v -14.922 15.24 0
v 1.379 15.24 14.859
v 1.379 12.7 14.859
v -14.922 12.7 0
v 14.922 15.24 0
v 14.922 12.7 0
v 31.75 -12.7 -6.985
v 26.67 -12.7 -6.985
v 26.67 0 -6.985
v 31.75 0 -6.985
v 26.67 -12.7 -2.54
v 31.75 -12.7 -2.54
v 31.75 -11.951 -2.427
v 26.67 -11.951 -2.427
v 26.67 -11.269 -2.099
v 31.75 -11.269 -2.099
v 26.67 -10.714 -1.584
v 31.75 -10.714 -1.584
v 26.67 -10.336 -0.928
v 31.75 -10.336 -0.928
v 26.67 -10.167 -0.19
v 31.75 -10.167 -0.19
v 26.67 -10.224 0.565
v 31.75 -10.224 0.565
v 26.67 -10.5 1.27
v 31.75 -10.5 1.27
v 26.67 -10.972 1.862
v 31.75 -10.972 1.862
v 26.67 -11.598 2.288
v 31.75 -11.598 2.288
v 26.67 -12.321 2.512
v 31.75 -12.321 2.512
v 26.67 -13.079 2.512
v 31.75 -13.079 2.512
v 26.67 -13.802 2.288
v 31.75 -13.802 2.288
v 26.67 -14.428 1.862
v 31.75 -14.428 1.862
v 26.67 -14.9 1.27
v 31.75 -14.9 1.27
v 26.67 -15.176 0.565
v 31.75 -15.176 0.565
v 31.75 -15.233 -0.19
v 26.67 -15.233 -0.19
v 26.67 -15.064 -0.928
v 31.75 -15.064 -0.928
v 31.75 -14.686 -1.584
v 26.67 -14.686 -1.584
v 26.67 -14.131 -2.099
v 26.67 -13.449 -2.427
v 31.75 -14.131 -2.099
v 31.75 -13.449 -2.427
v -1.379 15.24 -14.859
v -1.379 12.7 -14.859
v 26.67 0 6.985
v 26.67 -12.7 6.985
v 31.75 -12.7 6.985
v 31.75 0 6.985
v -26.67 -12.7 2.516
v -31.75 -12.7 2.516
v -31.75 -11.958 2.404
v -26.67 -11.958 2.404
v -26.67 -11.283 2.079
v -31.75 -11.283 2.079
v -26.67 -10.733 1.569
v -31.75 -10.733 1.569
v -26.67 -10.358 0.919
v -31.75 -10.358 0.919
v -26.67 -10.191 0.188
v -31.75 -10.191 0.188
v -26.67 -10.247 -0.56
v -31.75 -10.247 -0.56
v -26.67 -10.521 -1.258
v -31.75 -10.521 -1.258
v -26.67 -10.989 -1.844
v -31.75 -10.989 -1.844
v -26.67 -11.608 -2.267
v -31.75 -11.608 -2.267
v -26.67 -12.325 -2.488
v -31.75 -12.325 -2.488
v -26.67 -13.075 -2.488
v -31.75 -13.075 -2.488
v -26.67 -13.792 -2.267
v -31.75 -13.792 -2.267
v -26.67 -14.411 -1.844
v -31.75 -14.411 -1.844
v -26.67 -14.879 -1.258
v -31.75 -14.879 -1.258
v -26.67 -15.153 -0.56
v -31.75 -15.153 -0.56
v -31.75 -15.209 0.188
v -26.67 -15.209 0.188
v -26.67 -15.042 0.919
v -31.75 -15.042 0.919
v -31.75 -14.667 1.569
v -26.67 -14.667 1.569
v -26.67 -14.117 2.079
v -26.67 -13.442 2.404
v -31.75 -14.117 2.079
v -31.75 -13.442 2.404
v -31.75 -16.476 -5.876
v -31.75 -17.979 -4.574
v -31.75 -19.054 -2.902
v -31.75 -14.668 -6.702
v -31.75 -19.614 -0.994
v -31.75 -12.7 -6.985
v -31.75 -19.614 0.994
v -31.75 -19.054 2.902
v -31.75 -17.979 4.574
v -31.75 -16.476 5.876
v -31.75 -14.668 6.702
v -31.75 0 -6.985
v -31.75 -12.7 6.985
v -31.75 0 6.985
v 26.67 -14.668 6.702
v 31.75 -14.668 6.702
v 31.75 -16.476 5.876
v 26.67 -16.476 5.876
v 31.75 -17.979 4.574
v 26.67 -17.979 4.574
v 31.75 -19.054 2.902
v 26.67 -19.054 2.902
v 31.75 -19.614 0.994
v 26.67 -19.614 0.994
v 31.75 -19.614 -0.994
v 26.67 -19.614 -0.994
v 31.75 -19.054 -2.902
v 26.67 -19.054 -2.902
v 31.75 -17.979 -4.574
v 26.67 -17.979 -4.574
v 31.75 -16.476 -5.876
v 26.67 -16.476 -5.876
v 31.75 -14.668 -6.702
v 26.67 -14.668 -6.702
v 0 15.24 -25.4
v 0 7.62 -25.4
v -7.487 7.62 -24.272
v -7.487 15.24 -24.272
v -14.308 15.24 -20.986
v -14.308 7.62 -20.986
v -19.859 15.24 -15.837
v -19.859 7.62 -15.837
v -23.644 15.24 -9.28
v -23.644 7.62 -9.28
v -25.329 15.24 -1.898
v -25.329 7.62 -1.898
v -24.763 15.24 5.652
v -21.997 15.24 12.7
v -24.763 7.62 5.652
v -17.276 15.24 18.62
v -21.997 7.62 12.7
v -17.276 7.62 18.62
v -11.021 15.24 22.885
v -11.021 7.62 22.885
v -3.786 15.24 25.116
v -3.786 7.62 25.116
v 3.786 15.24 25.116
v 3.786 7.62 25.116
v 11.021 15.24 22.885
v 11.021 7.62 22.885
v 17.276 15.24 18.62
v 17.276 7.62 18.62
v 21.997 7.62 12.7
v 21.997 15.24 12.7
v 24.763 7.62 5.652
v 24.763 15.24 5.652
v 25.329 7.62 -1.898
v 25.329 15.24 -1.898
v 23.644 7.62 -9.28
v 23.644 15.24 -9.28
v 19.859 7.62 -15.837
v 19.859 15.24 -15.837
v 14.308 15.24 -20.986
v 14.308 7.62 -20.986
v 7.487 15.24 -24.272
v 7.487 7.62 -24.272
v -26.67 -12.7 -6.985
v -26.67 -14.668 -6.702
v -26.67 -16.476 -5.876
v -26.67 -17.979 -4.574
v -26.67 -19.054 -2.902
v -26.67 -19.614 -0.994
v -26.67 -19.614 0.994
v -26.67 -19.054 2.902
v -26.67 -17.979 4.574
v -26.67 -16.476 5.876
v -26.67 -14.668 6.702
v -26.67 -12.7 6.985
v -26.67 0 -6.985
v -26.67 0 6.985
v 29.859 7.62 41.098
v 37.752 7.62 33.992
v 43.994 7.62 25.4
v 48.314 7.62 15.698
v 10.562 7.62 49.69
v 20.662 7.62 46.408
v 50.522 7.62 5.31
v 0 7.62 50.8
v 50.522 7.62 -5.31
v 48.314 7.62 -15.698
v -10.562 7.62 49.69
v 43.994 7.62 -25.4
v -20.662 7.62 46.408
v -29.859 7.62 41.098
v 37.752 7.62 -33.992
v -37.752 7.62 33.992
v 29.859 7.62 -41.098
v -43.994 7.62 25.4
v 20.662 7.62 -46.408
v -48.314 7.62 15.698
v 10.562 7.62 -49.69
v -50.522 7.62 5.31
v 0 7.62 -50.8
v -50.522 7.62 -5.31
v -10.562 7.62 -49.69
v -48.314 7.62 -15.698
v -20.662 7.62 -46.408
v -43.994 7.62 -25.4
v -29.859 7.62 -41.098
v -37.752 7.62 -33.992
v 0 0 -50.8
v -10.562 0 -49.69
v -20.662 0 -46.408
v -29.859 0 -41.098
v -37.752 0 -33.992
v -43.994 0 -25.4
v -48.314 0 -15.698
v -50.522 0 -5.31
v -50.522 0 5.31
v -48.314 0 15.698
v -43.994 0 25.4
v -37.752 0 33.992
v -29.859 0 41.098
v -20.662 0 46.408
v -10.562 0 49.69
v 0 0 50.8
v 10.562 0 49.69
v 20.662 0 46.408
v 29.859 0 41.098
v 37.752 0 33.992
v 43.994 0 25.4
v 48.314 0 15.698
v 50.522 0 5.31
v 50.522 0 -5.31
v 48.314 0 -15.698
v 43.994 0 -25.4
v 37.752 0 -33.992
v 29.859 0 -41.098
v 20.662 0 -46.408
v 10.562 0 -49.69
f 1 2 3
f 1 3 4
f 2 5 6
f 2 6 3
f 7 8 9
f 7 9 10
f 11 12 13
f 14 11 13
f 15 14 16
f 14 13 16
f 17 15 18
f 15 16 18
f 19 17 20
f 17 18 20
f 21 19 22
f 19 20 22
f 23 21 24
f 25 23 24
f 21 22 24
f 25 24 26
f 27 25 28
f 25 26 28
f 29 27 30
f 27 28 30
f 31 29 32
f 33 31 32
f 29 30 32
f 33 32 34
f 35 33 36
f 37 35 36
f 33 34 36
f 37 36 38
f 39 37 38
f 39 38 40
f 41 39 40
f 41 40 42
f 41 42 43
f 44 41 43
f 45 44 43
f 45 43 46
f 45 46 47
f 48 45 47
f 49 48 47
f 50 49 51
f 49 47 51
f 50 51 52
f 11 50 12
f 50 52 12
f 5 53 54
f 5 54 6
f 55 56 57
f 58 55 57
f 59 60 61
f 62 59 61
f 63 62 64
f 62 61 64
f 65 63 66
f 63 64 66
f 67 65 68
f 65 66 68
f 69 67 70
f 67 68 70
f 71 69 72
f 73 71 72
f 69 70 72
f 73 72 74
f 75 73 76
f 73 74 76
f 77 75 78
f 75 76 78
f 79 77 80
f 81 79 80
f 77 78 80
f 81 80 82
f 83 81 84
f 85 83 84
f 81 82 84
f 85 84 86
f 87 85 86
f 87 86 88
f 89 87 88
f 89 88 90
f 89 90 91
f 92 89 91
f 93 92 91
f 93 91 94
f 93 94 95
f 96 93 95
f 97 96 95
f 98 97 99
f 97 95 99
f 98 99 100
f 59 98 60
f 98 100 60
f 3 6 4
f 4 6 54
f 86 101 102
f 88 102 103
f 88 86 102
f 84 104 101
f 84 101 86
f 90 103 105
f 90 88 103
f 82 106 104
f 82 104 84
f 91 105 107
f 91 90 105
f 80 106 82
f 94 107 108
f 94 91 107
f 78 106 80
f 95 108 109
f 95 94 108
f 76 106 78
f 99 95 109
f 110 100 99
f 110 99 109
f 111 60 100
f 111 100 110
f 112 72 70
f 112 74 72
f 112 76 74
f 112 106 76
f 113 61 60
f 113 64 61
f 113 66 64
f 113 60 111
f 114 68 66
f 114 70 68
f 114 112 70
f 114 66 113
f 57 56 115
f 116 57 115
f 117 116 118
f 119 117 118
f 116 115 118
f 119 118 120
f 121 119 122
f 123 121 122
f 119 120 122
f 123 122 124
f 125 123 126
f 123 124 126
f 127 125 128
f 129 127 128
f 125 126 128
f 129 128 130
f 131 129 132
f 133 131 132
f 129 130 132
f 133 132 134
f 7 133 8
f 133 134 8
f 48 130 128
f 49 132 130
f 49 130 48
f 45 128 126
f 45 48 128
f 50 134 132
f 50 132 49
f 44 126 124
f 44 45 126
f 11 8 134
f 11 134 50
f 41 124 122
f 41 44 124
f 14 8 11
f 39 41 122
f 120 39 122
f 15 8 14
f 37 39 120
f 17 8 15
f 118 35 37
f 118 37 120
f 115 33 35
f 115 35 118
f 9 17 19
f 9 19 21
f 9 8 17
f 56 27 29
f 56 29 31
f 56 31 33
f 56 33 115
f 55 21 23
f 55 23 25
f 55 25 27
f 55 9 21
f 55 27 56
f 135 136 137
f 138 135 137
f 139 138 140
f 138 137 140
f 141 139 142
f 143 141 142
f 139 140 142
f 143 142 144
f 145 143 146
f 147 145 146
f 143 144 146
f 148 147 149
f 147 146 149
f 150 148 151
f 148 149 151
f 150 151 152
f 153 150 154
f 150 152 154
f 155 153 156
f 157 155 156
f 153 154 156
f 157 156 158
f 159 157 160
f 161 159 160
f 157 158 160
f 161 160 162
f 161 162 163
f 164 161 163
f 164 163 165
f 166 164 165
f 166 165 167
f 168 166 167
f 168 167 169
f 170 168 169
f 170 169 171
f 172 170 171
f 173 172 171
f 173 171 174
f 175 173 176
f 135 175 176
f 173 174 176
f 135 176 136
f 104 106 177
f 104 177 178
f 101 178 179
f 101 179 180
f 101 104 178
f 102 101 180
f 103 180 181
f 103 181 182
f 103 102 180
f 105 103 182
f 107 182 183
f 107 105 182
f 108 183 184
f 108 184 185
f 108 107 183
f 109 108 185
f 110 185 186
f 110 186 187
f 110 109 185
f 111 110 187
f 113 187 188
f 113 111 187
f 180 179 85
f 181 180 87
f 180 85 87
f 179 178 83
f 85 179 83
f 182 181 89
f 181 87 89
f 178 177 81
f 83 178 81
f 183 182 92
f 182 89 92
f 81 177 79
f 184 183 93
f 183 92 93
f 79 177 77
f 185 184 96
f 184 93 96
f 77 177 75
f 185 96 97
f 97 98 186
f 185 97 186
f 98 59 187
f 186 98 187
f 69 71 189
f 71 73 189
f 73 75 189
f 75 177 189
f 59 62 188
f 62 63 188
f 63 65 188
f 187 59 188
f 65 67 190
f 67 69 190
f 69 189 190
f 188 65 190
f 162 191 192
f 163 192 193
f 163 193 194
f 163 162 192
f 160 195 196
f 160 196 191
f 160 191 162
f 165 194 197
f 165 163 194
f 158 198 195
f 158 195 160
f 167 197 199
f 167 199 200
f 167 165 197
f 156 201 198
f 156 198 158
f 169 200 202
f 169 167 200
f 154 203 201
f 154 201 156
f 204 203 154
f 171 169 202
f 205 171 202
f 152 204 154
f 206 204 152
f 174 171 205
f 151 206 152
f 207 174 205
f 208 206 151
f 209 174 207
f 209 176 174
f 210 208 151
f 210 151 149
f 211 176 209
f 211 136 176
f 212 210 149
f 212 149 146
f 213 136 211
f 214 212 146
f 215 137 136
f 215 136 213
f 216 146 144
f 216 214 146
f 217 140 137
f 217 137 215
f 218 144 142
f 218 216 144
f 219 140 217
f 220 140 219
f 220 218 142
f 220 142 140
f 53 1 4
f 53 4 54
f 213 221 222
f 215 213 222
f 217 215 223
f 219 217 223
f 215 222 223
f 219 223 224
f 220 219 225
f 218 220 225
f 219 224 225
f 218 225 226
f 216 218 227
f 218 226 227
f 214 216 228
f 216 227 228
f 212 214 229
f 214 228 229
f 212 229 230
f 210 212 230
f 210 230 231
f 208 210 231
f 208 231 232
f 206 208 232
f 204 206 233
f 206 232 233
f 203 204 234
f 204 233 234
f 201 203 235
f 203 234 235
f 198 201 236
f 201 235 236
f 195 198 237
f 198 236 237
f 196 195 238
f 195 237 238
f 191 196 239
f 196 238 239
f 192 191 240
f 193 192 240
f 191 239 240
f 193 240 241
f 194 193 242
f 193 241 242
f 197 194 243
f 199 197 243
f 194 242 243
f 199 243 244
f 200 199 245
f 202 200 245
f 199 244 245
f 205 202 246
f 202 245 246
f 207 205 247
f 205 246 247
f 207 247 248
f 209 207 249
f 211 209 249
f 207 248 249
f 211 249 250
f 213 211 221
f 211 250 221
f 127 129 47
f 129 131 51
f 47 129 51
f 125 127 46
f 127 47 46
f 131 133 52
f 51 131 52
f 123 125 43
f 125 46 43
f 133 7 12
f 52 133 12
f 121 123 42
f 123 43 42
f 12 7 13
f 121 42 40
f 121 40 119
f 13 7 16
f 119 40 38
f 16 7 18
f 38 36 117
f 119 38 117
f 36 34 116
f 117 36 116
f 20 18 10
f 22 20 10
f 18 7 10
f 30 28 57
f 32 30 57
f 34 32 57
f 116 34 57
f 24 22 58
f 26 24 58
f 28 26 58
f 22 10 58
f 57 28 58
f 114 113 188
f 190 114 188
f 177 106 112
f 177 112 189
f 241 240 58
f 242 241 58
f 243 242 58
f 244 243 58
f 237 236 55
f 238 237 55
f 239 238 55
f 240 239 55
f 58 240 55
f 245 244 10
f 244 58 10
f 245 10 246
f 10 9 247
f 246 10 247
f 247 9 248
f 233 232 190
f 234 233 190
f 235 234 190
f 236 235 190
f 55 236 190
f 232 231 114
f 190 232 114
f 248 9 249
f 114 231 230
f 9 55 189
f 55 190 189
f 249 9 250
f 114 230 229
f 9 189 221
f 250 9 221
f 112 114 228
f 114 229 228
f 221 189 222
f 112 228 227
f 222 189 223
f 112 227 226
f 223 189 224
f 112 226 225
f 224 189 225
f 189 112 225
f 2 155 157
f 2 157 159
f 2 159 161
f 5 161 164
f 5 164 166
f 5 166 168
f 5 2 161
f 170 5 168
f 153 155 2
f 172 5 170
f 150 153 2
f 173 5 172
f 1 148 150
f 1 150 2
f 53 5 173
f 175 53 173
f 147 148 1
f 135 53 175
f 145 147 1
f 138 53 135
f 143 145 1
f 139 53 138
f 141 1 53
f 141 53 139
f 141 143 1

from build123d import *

# Parameters (mm, degrees)
SKETCH1_R           = 50.8
BOSS_EXTRUDE1_DEPTH = 7.62
SKETCH2_W           = 5.08
SKETCH2_H           = 13.97
BOSS_EXTRUDE2_DEPTH = 12.7
SKETCH3_R           = 6.985
BOSS_EXTRUDE3_DEPTH = 5.08
SKETCH4_R           = 2.516115175
CUT_EXTRUDE1_DEPTH  = 5.08
SKETCH5_W           = 5.08
SKETCH5_H           = 13.97
BOSS_EXTRUDE4_DEPTH = 12.7
BOSS_EXTRUDE5_START = -5.08
SKETCH6_R           = 6.985
BOSS_EXTRUDE5_DEPTH = 5.08
SKETCH8_R           = 2.54
CUT_EXTRUDE2_DEPTH  = 5.08
SKETCH9_R           = 25.4
BOSS_EXTRUDE6_DEPTH = 7.62
CUT_EXTRUDE3_DEPTH  = 2.54


with BuildPart() as part:
    # Sketch1 → Boss-Extrude1 (new body)
    with BuildSketch(Plane(origin=(0, 0, 0), x_dir=(1, 0, 0), z_dir=(0, 1, 0))):
        with Locations(Location((0, 0, 0), (0, 0, 90))):
            Circle(SKETCH1_R)
    extrude(amount=BOSS_EXTRUDE1_DEPTH)

    # Sketch2 → Boss-Extrude2 (add)
    with BuildSketch(Plane.XZ):
        with Locations((-29.21, 0)):
            Rectangle(SKETCH2_W, SKETCH2_H)
    extrude(amount=BOSS_EXTRUDE2_DEPTH)

    # Sketch3 → Boss-Extrude3 (add)
    with BuildSketch(Plane.ZY.offset(31.75)):
        with Locations((0, -12.7)):
            Circle(SKETCH3_R)
    extrude(amount=-BOSS_EXTRUDE3_DEPTH)

    # Sketch4 → Cut-Extrude1 (cut)
    with BuildSketch(Plane.ZY.offset(31.75)):
        with Locations((0, -12.7)):
            Circle(SKETCH4_R)
    extrude(amount=-CUT_EXTRUDE1_DEPTH, mode=Mode.SUBTRACT)

    # Sketch5 → Boss-Extrude4 (add)
    with BuildSketch(Plane.XZ):
        with Locations((29.21, 0)):
            Rectangle(SKETCH5_W, SKETCH5_H)
    extrude(amount=BOSS_EXTRUDE4_DEPTH)

    # Sketch6 → Boss-Extrude5 (add)
    with BuildSketch(Plane(origin=(31.75, 0, 0), x_dir=(0, 0, -1), z_dir=(1, 0, 0)).offset(BOSS_EXTRUDE5_START)):
        with Locations((0, -12.7)):
            Circle(SKETCH6_R)
    extrude(amount=BOSS_EXTRUDE5_DEPTH)

    # Sketch8 → Cut-Extrude2 (cut)
    with BuildSketch(Plane(origin=(31.75, 0, 0), x_dir=(0, 0, -1), z_dir=(1, 0, 0))):
        with Locations((0, -12.7)):
            Circle(SKETCH8_R)
    extrude(amount=-CUT_EXTRUDE2_DEPTH, mode=Mode.SUBTRACT)

    # Sketch9 → Boss-Extrude6 (add)
    with BuildSketch(Plane(origin=(0, 7.62, 0), x_dir=(1, 0, 0), z_dir=(0, 1, 0))):
        with Locations(Location((0, 0, 0), (0, 0, 90))):
            Circle(SKETCH9_R)
    extrude(amount=BOSS_EXTRUDE6_DEPTH)

    # Sketch10 → Cut-Extrude3 (cut)
    with BuildSketch(Plane(origin=(0, 15.24, 0), x_dir=(1, 0, 0), z_dir=(0, 1, 0))):
        Polygon((1.37873117, -14.858671092), (-14.9225, 0), (-1.37873117, 14.858671092), (14.9225, 0), align=None)
    extrude(amount=-CUT_EXTRUDE3_DEPTH, mode=Mode.SUBTRACT)


solid = part.part
